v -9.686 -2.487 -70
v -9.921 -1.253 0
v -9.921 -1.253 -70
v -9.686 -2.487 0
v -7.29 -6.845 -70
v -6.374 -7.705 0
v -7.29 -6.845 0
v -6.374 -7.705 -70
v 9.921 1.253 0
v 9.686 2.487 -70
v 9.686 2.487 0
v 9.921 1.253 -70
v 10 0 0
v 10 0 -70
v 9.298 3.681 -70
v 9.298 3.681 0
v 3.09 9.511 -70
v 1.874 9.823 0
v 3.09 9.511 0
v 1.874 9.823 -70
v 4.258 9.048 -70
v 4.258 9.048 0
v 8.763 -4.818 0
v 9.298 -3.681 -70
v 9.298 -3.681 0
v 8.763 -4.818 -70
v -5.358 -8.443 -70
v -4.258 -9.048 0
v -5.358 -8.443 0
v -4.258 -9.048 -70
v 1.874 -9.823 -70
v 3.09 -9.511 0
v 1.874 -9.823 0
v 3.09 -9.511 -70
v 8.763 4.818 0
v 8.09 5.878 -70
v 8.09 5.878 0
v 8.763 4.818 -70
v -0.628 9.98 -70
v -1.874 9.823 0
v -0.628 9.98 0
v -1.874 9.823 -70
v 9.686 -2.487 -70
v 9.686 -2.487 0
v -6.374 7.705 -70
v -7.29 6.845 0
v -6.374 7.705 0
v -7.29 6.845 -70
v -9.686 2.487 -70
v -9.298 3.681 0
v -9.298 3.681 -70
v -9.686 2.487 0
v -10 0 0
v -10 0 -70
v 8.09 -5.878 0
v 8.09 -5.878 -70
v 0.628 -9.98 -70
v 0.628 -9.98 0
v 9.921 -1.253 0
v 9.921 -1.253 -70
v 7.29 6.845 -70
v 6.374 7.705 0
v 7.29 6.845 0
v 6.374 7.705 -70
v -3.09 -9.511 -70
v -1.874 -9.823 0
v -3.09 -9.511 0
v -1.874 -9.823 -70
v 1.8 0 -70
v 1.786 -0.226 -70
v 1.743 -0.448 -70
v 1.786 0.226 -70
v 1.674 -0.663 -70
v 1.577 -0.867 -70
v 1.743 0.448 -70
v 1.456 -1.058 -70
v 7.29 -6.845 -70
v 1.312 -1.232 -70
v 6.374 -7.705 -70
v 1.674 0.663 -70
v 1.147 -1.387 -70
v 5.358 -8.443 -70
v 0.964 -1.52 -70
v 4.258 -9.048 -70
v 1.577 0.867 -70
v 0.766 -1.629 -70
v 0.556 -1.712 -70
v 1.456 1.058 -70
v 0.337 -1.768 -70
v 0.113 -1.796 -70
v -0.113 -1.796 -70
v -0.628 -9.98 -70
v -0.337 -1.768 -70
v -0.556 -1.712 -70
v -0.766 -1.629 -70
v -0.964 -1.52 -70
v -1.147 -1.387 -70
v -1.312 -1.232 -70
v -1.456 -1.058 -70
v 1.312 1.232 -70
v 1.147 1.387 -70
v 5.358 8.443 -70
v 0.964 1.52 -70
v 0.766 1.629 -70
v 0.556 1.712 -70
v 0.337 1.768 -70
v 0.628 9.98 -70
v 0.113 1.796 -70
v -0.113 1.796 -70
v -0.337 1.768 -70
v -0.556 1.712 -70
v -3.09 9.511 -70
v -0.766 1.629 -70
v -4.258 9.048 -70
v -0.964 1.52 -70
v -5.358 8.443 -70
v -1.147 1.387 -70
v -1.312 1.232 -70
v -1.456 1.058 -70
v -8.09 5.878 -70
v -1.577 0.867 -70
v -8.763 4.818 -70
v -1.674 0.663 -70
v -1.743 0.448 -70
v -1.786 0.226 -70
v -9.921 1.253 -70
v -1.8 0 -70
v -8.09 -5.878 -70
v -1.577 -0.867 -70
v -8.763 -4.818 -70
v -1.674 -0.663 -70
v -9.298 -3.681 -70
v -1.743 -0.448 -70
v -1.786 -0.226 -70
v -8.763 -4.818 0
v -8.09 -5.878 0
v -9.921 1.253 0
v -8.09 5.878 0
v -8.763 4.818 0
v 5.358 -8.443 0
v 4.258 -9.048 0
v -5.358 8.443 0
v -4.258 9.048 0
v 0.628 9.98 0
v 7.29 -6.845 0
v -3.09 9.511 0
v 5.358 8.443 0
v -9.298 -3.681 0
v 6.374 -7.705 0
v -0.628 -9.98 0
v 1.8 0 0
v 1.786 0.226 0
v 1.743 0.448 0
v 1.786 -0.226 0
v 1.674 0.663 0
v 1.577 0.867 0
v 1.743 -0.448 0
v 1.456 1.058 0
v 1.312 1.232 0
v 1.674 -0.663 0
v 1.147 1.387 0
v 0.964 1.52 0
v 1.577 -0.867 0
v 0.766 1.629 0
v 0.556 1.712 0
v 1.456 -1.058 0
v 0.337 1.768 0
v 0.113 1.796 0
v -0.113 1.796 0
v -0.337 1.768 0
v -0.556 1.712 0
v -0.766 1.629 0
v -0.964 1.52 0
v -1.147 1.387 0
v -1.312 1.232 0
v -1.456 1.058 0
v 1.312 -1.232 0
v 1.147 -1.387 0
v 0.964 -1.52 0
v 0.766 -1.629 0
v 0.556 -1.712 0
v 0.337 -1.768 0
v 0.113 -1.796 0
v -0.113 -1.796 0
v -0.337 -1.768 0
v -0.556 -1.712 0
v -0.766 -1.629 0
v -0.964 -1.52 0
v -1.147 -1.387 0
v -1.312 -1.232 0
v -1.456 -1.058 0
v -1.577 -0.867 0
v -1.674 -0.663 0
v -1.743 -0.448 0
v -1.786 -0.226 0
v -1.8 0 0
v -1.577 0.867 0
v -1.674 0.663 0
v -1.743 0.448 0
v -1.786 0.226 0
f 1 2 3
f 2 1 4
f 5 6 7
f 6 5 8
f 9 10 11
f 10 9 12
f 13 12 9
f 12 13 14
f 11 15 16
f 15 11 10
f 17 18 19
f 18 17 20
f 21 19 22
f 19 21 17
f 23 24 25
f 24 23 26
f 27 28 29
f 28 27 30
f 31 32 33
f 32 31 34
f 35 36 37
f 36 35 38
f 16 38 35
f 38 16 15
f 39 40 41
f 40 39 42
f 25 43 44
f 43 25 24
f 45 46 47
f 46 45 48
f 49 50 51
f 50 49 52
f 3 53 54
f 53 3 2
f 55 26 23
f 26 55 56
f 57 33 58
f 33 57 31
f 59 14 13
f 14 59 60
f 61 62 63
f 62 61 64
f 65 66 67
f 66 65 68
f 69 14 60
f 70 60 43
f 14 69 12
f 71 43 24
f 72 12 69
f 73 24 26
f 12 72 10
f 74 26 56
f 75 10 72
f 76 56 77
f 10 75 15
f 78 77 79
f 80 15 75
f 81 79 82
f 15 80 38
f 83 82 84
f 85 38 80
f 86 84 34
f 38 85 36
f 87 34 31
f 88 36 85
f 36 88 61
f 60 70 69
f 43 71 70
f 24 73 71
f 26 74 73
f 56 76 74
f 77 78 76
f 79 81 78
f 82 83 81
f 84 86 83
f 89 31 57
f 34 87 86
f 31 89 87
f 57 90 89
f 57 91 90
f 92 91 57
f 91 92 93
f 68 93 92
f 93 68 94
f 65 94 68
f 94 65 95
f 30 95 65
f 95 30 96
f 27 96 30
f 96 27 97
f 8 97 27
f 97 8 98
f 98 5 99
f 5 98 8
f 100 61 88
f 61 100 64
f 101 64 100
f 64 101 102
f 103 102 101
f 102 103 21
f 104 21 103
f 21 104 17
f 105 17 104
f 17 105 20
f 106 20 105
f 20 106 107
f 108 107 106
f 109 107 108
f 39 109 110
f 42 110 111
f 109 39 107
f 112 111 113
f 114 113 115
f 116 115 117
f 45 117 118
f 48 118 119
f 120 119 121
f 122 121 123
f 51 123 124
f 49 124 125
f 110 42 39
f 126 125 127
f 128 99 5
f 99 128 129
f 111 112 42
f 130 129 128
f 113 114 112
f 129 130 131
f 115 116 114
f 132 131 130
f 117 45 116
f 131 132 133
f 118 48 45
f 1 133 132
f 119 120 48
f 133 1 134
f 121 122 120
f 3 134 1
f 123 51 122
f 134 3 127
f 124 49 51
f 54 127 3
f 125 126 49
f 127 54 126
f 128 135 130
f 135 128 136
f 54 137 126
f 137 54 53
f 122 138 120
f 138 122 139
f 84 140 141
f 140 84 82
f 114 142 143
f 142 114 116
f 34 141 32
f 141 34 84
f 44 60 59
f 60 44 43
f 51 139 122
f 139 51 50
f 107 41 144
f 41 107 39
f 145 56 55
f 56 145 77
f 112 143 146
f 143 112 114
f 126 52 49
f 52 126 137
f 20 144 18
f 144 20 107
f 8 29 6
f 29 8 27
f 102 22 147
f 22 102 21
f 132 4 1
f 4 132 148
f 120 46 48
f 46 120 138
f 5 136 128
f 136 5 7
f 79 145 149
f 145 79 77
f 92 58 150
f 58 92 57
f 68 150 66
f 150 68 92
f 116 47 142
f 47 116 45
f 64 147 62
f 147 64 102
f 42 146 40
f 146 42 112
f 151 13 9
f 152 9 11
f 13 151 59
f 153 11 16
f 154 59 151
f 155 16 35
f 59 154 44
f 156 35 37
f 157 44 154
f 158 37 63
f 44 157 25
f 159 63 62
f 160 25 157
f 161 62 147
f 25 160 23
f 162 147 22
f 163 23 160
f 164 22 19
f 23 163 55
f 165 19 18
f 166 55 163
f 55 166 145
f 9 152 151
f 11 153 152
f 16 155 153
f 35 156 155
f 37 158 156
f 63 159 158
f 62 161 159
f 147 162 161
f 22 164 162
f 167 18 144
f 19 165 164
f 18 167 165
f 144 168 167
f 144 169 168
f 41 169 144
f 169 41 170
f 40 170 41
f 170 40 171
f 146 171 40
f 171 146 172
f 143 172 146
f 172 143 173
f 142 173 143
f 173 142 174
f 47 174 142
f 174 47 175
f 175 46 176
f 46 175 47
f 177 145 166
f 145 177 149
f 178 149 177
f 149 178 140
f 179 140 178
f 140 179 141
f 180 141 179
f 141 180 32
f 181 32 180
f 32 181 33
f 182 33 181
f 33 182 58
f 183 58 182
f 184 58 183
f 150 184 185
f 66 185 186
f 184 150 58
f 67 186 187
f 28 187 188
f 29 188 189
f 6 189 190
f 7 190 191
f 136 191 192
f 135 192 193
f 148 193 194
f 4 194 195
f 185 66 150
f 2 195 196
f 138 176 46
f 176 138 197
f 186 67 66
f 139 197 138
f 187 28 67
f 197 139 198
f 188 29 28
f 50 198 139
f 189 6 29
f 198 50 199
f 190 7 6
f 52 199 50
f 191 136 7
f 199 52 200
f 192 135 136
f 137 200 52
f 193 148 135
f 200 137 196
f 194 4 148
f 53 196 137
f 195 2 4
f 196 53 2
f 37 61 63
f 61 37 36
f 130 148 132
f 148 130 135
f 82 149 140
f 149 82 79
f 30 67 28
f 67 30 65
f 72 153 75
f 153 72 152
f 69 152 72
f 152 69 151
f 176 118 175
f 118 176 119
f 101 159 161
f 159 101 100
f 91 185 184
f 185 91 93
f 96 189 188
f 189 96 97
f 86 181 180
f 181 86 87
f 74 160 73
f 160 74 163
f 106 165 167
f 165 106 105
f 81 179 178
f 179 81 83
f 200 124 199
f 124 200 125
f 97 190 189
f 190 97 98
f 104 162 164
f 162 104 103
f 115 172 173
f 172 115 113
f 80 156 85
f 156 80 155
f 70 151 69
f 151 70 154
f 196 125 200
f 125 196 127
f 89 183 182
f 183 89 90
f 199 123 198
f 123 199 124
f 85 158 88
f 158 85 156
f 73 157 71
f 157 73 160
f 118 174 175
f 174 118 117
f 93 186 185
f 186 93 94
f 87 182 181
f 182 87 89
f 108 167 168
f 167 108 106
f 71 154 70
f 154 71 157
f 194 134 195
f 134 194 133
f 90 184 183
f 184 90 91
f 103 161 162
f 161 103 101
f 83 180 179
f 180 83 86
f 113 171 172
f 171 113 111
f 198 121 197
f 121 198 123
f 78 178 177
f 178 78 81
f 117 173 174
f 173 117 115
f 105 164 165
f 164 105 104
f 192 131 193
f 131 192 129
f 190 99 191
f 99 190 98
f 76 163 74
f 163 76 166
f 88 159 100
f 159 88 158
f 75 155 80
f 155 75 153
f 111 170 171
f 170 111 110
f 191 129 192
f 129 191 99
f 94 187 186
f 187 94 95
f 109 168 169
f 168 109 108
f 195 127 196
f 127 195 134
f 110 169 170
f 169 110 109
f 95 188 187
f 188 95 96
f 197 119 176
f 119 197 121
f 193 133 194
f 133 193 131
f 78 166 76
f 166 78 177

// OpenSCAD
$fn = 50;


difference() {
	union() {
		translate(v = [0, 0, -70.0000000000]) {
			cylinder(h = 70, r = 10.0000000000);
		}
		cylinder(h = 0, r = 20.0000000000);
	}
	union() {
		#translate(v = [0, 0, -70]) {
			cylinder(h = 70, r = 1.8000000000);
		}
	}
}
